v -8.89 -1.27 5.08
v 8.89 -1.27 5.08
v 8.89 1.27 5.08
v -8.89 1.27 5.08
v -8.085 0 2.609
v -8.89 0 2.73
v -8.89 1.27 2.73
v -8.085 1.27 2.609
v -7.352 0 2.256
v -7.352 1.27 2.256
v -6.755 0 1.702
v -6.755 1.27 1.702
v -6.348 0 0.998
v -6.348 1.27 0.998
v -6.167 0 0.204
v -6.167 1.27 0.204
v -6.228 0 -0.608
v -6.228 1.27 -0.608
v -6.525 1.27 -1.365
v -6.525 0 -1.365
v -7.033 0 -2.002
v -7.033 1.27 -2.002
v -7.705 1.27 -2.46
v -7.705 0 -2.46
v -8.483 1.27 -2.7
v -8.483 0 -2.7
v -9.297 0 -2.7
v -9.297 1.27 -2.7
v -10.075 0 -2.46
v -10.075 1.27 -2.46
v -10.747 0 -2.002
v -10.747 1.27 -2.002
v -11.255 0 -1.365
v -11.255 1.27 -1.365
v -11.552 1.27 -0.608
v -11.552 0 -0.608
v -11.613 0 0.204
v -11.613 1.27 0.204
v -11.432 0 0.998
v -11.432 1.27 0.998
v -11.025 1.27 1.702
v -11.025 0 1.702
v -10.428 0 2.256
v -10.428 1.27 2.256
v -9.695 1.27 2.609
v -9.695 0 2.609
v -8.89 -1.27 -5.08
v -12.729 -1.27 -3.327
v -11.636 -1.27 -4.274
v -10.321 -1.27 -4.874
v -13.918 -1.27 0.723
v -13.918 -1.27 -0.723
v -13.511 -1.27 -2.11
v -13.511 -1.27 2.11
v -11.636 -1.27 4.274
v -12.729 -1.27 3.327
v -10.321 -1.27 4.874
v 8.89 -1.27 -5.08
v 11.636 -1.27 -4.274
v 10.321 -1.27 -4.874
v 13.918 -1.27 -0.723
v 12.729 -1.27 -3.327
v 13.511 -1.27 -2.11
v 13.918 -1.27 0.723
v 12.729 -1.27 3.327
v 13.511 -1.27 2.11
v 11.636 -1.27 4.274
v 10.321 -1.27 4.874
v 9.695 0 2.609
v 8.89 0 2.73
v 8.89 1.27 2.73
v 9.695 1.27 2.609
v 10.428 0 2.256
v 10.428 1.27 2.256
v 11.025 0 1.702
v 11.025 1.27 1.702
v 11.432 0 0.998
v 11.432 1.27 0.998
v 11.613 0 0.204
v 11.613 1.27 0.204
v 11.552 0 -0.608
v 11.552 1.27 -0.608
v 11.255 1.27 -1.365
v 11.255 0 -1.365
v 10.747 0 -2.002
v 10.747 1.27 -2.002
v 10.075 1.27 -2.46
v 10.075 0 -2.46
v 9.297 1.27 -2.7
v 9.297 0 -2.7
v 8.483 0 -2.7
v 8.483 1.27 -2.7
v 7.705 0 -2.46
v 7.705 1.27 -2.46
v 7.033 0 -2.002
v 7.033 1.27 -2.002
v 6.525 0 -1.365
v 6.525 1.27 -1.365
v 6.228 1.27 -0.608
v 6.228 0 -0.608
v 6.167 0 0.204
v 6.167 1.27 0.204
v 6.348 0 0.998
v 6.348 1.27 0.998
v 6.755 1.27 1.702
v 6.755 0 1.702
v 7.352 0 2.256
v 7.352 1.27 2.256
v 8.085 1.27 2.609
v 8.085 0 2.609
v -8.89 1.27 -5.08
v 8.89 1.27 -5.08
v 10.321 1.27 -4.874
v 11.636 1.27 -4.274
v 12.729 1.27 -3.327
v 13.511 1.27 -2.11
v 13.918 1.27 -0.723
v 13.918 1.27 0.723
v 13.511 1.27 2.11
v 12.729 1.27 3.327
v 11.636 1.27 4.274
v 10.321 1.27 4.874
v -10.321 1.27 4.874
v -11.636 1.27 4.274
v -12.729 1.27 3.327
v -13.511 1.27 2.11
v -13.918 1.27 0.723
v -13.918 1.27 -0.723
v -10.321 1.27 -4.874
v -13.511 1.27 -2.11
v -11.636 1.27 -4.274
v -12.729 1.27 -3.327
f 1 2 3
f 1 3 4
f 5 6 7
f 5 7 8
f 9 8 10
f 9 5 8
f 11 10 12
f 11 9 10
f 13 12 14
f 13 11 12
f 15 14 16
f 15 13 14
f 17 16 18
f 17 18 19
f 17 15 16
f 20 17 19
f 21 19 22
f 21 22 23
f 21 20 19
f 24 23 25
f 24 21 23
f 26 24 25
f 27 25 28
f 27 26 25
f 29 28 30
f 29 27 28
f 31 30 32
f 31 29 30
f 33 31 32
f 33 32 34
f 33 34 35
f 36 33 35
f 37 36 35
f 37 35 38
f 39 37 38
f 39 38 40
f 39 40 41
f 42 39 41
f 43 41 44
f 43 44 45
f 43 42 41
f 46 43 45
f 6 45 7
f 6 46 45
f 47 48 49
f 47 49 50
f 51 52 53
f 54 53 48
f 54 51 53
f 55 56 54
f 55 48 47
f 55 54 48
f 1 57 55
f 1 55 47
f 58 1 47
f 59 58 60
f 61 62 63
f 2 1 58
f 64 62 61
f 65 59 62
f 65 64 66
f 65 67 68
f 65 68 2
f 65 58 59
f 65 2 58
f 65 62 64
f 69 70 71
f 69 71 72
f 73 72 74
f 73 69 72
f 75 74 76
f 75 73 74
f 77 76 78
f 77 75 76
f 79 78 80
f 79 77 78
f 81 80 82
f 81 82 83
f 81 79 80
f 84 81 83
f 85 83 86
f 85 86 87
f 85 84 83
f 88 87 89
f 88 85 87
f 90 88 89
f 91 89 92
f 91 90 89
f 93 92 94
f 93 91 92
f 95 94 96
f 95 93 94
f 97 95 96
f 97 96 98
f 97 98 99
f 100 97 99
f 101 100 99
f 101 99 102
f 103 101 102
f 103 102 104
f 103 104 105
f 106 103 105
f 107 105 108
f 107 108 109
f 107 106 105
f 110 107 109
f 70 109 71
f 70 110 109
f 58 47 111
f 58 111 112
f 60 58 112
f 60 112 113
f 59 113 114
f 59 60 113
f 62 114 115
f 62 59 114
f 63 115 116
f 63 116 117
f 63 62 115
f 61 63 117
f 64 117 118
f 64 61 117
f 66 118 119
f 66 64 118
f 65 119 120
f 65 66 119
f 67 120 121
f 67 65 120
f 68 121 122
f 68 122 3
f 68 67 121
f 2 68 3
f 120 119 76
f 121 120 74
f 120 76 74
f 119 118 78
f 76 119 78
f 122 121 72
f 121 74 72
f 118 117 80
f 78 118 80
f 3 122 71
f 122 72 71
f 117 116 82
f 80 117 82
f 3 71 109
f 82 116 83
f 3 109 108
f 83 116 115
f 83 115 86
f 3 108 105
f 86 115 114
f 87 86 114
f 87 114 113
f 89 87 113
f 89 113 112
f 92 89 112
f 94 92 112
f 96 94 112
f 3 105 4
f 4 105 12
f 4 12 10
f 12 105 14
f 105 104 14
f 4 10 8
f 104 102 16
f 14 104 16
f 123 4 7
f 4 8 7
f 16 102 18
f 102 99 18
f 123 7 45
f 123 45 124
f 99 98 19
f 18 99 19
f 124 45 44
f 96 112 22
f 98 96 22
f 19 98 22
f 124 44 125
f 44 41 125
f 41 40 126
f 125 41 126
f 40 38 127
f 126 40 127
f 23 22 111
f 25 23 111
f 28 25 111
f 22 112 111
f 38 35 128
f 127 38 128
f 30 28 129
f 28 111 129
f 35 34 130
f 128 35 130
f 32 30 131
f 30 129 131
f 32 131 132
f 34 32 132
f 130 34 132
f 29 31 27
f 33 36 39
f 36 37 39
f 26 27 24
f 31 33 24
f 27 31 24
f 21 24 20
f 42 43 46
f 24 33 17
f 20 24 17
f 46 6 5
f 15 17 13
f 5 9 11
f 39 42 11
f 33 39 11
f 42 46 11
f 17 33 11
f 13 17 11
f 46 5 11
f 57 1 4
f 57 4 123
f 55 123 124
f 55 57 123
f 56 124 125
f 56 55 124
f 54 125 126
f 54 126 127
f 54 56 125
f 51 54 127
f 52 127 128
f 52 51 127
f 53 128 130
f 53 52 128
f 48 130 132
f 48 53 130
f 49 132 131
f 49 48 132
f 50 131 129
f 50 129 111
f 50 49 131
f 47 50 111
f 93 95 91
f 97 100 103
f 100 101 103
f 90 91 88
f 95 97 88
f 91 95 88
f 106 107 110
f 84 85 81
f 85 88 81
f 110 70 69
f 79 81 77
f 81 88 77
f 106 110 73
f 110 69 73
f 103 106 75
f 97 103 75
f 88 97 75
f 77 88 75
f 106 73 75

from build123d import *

# Parameters (mm, degrees)
SKETCH1_R           = 2.7305
BOSS_EXTRUDE1_DEPTH = 1.27
BOSS_EXTRUDE2_START = 1.27
BOSS_EXTRUDE2_DEPTH = 1.27


with BuildPart() as part:
    # Sketch1 → Boss-Extrude1 (new body)
    with BuildSketch(Plane(origin=(0, 0, 0), x_dir=(1, 0, 0), z_dir=(0, 1, 0))):
        with BuildLine():
            Line((8.89, -5.08), (-8.89, -5.08))
            ThreePointArc((-8.89, -5.08), (-13.97, 0), (-8.89, 5.08))
            Line((-8.89, 5.08), (8.89, 5.08))
            ThreePointArc((8.89, 5.08), (13.97, 0), (8.89, -5.08))
        make_face()
        with Locations(Location((-8.89, 0, 0), (0, 0, 270))):
            Circle(SKETCH1_R, mode=Mode.SUBTRACT)
        with Locations(Location((8.89, 0, 0), (0, 0, 270))):
            Circle(SKETCH1_R, mode=Mode.SUBTRACT)
    extrude(amount=BOSS_EXTRUDE1_DEPTH)

    # Sketch2 → Boss-Extrude2 (add)
    with BuildSketch(Plane.XZ.offset(BOSS_EXTRUDE2_START)):
        with BuildLine():
            Line((8.89, 5.08), (-8.89, 5.08))
            ThreePointArc((-8.89, 5.08), (-13.97, 0), (-8.89, -5.08))
            Line((-8.89, -5.08), (8.89, -5.08))
            ThreePointArc((8.89, -5.08), (13.97, 0), (8.89, 5.08))
        make_face()
    extrude(amount=-BOSS_EXTRUDE2_DEPTH)


solid = part.part
